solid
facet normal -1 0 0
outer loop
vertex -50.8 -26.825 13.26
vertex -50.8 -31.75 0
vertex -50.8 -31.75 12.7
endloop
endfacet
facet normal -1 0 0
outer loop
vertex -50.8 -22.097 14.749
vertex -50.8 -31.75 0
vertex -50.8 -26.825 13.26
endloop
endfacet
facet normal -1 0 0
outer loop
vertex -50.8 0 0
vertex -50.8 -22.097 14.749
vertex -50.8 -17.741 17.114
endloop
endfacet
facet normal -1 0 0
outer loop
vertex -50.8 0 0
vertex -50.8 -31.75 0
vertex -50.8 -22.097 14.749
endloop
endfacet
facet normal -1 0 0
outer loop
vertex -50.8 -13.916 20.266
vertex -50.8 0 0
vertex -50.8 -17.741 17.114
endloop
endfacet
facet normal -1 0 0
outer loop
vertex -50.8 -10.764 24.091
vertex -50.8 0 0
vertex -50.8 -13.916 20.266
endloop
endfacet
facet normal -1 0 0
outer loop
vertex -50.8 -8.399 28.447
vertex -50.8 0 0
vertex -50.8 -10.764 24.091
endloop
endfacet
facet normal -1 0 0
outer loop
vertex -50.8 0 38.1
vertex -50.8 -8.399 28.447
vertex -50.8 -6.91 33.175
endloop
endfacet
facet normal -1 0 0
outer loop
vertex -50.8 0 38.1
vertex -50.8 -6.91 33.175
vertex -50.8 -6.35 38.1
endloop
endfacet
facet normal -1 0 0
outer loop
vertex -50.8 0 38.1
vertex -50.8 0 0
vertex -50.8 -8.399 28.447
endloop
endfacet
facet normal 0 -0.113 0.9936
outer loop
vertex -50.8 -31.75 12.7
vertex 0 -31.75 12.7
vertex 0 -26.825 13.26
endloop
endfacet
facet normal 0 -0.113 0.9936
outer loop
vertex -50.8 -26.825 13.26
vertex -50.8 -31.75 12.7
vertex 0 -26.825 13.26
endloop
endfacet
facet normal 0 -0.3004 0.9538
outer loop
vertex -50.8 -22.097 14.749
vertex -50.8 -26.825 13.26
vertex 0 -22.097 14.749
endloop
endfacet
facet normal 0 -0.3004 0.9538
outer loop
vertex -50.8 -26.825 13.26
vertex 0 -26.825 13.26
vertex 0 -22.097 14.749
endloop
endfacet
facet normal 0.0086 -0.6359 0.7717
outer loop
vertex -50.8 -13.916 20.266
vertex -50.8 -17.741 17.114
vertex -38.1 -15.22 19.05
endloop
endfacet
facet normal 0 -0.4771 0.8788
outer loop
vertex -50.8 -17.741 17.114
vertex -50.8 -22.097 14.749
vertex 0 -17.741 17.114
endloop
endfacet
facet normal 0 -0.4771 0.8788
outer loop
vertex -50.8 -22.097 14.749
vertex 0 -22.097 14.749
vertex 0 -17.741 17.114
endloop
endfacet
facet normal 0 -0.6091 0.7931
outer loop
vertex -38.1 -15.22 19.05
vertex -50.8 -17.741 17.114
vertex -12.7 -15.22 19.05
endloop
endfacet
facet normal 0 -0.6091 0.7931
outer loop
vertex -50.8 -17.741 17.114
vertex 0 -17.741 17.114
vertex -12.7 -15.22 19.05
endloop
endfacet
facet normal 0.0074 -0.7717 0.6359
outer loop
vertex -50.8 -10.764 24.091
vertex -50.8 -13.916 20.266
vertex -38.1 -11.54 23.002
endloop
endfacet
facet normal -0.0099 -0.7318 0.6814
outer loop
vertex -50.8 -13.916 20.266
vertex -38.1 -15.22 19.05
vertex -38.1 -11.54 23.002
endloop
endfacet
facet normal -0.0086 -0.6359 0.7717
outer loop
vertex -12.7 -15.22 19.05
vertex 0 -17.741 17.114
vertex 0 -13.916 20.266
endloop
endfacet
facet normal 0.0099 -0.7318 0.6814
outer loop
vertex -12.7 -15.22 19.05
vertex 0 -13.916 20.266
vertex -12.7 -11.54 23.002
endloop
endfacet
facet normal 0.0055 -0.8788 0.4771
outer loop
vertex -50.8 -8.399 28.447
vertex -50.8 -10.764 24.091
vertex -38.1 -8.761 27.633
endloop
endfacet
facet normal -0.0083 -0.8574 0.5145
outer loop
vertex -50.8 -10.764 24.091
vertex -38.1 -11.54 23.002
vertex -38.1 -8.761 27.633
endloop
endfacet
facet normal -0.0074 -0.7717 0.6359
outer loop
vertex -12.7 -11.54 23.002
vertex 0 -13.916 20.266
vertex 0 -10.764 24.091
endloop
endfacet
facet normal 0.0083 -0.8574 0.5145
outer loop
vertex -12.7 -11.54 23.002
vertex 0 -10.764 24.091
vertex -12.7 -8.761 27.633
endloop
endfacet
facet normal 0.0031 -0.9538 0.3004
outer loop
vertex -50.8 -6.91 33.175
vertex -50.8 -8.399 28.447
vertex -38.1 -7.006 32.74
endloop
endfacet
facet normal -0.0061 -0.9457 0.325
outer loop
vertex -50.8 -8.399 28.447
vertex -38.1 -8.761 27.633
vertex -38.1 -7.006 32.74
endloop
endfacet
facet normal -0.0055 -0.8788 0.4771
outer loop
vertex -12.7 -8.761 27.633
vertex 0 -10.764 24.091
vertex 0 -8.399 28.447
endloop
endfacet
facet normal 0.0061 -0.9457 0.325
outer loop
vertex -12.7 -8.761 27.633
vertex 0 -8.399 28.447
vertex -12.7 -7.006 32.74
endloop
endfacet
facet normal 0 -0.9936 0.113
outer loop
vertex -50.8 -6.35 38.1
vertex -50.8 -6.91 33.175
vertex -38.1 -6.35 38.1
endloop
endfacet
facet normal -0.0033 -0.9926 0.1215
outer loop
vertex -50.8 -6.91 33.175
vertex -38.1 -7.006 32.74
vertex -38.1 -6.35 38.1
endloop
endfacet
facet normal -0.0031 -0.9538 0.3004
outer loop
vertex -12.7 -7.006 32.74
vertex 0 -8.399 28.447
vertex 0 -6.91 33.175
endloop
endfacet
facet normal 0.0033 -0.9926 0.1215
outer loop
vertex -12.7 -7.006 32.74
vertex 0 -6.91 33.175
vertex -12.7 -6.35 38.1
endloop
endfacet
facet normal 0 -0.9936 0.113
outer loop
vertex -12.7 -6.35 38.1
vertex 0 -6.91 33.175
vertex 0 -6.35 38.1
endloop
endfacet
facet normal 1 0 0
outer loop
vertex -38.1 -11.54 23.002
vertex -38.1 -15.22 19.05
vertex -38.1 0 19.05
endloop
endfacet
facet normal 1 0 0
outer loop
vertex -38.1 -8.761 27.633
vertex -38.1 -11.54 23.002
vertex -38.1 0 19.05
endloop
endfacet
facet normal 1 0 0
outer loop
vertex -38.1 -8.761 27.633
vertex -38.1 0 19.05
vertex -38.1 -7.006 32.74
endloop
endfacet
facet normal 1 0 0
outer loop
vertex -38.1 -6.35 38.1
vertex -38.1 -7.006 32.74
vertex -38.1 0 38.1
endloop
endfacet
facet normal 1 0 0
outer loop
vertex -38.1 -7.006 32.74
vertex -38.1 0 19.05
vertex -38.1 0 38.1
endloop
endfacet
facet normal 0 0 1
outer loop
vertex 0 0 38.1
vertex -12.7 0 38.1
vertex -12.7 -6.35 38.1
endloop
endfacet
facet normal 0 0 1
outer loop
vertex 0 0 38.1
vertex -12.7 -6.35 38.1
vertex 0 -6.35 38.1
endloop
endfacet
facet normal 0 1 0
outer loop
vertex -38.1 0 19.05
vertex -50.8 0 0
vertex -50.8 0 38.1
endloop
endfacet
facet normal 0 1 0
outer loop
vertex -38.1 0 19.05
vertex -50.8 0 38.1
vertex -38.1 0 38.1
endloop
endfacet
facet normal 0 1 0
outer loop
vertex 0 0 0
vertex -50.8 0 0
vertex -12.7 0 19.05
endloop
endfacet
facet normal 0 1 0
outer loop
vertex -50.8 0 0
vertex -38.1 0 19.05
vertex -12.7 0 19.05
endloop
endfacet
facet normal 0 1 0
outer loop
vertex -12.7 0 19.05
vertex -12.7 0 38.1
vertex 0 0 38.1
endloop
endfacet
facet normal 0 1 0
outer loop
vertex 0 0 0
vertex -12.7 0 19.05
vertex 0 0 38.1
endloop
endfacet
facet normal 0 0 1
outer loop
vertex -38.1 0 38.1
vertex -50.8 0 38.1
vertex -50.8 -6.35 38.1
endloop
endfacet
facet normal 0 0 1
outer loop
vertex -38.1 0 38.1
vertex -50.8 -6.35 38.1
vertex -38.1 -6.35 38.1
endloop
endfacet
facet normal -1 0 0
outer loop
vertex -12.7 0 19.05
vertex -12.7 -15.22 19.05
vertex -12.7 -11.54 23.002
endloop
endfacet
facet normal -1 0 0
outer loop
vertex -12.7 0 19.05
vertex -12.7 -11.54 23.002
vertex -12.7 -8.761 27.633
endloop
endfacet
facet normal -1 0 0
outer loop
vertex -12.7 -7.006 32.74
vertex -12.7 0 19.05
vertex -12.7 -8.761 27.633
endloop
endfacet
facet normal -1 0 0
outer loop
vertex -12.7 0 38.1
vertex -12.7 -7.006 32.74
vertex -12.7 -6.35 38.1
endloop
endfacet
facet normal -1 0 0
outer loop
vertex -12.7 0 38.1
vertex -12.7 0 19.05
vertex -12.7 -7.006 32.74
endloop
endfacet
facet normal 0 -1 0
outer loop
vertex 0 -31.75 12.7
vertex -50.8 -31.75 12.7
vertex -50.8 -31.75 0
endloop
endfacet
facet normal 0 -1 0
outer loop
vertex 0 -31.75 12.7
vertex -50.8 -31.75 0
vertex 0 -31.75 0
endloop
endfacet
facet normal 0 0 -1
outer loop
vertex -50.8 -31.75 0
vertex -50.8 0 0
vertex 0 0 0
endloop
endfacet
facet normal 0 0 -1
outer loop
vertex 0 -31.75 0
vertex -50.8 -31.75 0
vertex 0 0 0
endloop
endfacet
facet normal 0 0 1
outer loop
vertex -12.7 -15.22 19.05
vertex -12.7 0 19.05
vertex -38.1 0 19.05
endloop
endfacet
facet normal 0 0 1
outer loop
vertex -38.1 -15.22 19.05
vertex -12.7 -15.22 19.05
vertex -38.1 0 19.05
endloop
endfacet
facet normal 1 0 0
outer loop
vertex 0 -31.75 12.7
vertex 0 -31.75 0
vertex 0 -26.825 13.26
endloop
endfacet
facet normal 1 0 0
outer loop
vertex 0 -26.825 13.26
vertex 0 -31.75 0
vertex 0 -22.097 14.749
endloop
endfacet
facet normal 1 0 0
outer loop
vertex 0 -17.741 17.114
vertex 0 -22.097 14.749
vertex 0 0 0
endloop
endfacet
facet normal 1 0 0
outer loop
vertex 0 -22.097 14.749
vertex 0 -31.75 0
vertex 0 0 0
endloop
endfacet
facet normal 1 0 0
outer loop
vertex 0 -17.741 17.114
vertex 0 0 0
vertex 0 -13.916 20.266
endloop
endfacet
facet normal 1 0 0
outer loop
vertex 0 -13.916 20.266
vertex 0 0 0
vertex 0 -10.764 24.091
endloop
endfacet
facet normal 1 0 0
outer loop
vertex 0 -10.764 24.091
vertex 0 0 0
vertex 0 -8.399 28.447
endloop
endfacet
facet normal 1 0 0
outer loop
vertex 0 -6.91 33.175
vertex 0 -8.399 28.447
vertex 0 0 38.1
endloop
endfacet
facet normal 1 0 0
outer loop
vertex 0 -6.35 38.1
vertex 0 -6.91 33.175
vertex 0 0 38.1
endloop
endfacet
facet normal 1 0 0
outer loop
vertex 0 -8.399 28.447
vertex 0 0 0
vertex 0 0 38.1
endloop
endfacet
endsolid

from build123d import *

# Parameters (mm, degrees)
F0_W     = 50.8
F0_H     = 38.1
F1_DEPTH = 31.75
F3_DEPTH = 50.801
F4_W     = 25.4
F4_H     = 19.05
F5_DEPTH = 25.4


with BuildPart() as f1:
    # F0 (on Front) → F1 (new body)
    with BuildSketch(Plane.XZ):
        with Locations((-25.4, 19.05)):
            Rectangle(F0_W, F0_H)
    extrude(amount=F1_DEPTH)

    # F2 (on face) → F3 (cut, through all)
    with BuildSketch(Plane.YZ):
        with BuildLine():
            Line((-31.75, 38.1), (-31.75, 12.7))
            ThreePointArc((-31.75, 12.7), (-13.916344, 20.266344), (-6.35, 38.1))
            Line((-6.35, 38.1), (-31.75, 38.1))
        make_face()
    extrude(amount=-F3_DEPTH, mode=Mode.SUBTRACT)

    # F4 (on face) → F5 (cut)
    with BuildSketch(Plane(origin=(0, 0, 0), x_dir=(-1, 0, 0), z_dir=(0, 1, 0))):
        with Locations((25.4, 28.575)):
            Rectangle(F4_W, F4_H)
    extrude(amount=-F5_DEPTH, mode=Mode.SUBTRACT)


solid = f1.part
